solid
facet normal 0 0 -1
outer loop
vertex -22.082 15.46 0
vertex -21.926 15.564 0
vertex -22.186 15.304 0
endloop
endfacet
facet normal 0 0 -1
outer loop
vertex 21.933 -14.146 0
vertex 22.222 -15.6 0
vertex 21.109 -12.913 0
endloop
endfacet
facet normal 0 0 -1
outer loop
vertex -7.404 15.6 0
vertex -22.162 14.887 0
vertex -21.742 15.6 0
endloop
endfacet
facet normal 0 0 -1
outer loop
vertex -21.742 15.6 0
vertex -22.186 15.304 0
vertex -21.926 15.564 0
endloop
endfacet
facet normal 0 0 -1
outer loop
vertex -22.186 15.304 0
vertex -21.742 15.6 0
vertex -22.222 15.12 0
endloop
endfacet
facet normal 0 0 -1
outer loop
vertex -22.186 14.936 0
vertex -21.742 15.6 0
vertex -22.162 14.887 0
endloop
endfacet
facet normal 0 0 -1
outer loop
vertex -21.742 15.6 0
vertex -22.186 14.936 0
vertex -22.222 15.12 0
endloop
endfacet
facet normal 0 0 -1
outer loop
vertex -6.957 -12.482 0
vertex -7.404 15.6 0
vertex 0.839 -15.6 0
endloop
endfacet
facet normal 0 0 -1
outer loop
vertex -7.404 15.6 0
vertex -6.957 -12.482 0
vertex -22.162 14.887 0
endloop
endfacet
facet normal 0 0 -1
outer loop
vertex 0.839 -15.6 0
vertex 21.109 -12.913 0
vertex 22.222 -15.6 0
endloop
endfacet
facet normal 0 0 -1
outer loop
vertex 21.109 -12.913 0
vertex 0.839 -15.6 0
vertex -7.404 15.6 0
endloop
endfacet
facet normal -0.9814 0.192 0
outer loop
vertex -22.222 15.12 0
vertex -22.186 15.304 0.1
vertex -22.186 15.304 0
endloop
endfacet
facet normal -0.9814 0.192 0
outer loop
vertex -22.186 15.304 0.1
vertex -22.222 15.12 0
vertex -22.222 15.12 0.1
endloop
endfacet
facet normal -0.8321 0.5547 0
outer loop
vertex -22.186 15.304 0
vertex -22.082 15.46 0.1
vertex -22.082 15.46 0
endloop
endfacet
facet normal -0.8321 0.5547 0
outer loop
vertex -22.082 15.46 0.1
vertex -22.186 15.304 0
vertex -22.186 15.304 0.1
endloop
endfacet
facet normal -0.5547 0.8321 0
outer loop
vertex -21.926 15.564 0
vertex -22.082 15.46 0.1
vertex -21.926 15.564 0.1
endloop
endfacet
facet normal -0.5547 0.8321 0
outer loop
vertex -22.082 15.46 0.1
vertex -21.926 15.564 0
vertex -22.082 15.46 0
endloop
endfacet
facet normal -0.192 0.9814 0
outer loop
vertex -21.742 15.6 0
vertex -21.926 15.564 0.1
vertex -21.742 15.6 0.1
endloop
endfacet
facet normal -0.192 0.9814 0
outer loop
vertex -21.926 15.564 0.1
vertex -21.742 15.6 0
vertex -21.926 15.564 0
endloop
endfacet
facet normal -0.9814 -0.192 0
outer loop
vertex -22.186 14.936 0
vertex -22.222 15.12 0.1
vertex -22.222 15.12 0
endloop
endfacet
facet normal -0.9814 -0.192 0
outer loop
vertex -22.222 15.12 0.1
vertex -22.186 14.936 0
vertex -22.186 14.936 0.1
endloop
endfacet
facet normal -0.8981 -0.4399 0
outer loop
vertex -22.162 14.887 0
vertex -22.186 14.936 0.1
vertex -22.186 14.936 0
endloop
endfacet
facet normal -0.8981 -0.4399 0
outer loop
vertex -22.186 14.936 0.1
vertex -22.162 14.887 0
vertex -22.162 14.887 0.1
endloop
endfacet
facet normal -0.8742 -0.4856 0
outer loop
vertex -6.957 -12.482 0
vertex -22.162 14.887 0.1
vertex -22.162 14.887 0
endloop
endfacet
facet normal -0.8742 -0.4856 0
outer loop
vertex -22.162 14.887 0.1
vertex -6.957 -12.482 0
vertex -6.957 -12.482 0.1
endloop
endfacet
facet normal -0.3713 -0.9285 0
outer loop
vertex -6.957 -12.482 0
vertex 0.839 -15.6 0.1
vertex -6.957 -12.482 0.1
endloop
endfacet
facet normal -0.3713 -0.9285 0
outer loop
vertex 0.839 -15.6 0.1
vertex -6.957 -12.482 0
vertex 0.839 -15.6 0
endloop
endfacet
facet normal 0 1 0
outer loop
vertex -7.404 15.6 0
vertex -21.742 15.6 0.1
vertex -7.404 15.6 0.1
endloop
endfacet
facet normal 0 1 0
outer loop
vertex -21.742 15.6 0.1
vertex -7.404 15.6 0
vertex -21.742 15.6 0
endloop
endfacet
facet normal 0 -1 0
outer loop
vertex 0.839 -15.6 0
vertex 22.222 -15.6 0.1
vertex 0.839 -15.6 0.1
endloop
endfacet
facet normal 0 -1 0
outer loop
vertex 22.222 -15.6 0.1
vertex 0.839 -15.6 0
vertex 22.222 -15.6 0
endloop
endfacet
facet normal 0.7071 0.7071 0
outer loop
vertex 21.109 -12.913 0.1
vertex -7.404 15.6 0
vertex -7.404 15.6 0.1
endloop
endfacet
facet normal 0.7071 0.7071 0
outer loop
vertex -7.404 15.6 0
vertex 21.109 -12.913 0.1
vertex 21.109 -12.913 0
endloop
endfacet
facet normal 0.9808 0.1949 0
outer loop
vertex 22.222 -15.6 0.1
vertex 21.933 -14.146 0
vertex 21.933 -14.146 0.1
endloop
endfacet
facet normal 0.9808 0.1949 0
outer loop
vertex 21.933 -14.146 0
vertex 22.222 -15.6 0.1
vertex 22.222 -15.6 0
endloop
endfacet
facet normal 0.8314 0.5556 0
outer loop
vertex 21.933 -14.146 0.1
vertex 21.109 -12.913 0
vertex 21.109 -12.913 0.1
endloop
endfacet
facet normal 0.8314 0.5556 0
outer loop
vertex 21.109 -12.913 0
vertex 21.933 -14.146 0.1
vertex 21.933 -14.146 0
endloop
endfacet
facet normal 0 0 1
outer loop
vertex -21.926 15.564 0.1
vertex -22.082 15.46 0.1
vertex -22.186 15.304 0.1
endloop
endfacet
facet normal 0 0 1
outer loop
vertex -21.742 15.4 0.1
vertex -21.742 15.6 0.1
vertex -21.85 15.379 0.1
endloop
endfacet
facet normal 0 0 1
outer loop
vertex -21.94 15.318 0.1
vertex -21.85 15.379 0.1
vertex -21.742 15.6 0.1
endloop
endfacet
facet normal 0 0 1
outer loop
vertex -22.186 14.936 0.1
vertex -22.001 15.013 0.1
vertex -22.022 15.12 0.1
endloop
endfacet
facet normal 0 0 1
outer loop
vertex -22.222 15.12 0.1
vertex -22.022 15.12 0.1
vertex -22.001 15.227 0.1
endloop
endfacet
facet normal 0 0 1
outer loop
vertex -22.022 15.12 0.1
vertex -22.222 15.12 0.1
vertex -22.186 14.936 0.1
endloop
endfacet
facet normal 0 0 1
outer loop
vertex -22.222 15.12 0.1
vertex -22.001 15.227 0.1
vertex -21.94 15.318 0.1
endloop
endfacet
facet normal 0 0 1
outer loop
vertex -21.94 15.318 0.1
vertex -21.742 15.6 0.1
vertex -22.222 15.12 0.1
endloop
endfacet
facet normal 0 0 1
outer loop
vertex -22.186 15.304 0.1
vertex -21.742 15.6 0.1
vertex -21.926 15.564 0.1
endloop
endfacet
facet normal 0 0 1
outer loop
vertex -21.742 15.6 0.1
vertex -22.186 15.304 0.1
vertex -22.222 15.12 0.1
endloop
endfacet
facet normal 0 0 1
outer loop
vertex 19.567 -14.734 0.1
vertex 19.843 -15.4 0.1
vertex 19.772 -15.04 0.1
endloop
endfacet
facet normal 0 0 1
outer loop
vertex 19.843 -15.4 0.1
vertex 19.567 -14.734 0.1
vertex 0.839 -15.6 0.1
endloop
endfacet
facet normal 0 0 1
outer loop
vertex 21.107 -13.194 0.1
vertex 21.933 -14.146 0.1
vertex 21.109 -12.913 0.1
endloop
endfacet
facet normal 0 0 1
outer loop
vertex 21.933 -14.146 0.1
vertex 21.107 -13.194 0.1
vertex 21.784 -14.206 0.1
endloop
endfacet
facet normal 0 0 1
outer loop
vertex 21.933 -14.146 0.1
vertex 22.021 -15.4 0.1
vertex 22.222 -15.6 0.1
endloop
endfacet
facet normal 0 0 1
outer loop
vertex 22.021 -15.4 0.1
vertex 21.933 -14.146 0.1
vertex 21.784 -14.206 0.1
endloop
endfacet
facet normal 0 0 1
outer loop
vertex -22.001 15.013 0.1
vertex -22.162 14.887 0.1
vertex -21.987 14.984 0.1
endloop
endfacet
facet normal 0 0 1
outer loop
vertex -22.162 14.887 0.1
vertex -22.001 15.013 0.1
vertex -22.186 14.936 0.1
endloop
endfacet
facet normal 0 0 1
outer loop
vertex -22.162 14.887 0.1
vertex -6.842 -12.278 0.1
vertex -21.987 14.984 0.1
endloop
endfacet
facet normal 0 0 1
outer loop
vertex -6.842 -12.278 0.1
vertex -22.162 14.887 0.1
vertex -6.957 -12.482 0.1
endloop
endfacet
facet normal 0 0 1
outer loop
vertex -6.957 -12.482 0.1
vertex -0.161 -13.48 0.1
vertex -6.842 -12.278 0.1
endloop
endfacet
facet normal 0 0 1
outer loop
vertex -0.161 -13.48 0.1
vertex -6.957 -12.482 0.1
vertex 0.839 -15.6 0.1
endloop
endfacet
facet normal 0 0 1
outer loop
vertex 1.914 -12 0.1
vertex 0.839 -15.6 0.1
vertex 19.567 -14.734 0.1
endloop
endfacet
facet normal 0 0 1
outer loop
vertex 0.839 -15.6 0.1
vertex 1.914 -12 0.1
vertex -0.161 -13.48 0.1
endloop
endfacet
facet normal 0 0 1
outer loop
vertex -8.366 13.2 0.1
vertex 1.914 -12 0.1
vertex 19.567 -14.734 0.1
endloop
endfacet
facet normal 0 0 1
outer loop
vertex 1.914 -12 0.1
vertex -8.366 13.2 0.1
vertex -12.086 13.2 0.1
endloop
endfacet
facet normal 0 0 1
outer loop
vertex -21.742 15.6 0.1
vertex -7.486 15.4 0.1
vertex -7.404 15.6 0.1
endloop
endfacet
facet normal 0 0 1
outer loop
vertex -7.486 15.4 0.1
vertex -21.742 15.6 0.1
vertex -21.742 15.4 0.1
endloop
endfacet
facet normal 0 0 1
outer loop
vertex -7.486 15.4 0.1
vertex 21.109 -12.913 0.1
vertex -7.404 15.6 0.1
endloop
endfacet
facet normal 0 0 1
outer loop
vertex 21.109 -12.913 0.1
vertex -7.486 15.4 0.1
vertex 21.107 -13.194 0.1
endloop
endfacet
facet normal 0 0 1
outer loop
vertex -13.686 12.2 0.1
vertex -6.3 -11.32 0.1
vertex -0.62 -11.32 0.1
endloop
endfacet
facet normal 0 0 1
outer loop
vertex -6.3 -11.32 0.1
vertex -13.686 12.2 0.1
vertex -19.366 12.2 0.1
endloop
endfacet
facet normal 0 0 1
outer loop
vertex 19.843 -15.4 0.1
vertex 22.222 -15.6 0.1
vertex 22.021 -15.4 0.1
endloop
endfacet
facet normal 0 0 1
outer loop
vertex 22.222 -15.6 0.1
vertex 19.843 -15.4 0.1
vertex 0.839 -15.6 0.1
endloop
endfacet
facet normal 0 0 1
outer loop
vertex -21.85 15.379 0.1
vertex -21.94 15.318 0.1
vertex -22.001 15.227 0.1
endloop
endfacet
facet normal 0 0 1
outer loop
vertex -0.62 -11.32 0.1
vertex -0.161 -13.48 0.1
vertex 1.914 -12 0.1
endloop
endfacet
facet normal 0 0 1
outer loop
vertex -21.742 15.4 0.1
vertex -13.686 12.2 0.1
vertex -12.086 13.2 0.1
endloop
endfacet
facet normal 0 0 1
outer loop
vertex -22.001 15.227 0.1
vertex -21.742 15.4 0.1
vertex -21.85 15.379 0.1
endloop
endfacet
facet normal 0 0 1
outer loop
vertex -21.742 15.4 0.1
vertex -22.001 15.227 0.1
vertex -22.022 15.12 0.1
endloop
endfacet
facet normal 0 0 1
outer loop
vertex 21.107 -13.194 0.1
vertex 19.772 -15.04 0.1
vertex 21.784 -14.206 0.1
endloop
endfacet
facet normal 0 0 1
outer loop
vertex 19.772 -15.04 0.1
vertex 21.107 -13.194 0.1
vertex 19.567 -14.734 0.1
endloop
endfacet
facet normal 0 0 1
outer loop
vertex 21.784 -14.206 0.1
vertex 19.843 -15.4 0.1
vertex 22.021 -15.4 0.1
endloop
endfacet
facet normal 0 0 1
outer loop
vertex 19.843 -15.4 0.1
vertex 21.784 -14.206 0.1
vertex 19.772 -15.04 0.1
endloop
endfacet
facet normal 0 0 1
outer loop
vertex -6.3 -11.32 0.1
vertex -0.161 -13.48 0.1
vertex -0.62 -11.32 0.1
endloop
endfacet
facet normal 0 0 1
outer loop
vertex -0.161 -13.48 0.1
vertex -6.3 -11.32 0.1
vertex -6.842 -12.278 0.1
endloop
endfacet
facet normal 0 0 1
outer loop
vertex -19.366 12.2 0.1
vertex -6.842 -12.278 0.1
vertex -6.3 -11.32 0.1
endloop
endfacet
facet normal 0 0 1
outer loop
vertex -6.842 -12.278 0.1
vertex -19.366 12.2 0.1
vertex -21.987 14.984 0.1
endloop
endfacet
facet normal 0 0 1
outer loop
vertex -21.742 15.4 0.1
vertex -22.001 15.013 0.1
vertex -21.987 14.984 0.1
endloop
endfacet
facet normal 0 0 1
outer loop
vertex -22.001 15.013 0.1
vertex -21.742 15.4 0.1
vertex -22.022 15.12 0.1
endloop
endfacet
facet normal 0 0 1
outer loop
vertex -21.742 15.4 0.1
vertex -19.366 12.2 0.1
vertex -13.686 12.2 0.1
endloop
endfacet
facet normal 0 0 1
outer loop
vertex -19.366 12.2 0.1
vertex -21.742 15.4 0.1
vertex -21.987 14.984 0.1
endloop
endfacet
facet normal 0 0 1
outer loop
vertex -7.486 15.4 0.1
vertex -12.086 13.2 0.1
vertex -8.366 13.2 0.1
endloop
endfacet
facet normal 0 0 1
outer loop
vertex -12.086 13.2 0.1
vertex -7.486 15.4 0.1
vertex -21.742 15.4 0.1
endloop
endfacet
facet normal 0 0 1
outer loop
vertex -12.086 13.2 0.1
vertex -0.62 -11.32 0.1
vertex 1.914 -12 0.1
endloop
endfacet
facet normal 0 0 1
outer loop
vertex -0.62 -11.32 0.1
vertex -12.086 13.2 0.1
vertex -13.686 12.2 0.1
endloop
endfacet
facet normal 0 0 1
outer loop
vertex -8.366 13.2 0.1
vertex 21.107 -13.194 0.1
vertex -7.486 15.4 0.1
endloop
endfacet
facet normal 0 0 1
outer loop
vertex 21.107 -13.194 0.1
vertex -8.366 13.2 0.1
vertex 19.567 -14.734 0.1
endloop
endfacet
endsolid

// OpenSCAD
use <../lib.scad>
function ldraw_lib__169665a() = [
// 0 Sticker  3.9 x  5.6 with Black Space Shuttle Tail Lines Left Side
// 0 Name: 169665a.dat
// 0 Author: Chris Böhnke [KnightOfTarenta]
// 0 !LDRAW_ORG Part UPDATE 2026-06
// 0 !LICENSE Licensed under CC BY 4.0 : see CAreadme.txt
// 
// 0 BFC CERTIFY CCW
  [0,"BFC","CERTIFY"],
  [0,"BFC","CCW"],
// 
// 0 !KEYWORDS Bricklink 6339stk01, Brickowl 588738, Launch Command
// 0 !KEYWORDS Rebrickable 169665, set 6339, Shuttle Launch Pad, space port, town
// 
// 0 !HISTORY 2026-06-28 [OrionP] Official Update 2026-06
// 
// 0 // Sticker Base
// 3 16 -55.205 0 38.649 -54.815 0 38.909 -55.465 0 38.259
  [3,16,-55.205,0,38.649,-54.815,0,38.909,-55.465,0,38.259],
// 3 16 54.833 0 -35.364 55.556 0 -39 52.773 0 -32.282
  [3,16,54.833,0,-35.364,55.556,0,-39,52.773,0,-32.282],
// 3 16 -18.509 0 39 -55.405 0 37.217 -54.356 0 39
  [3,16,-18.509,0,39,-55.405,0,37.217,-54.356,0,39],
// 4 16 -55.465 0 38.259 -54.815 0 38.909 -54.356 0 39 -55.556 0 37.8
  [4,16,-55.465,0,38.259,-54.815,0,38.909,-54.356,0,39,-55.556,0,37.8],
// 4 16 -54.356 0 39 -55.405 0 37.217 -55.465 0 37.341 -55.556 0 37.8
  [4,16,-54.356,0,39,-55.405,0,37.217,-55.465,0,37.341,-55.556,0,37.8],
// 4 16 -55.405 0 37.217 -18.509 0 39 2.098 0 -39 -17.393 0 -31.204
  [4,16,-55.405,0,37.217,-18.509,0,39,2.098,0,-39,-17.393,0,-31.204],
// 4 16 55.556 0 -39 2.098 0 -39 -18.509 0 39 52.773 0 -32.282
  [4,16,55.556,0,-39,2.098,0,-39,-18.509,0,39,52.773,0,-32.282],
// 
// 0 // Sticker Sides
// 4 16 -55.556 -.25 37.8 -55.465 -.25 38.259 -55.465 0 38.259 -55.556 0 37.8
  [4,16,-55.556,-.25,37.8,-55.465,-.25,38.259,-55.465,0,38.259,-55.556,0,37.8],
// 4 16 -55.465 -.25 38.259 -55.205 -.25 38.649 -55.205 0 38.649 -55.465 0 38.259
  [4,16,-55.465,-.25,38.259,-55.205,-.25,38.649,-55.205,0,38.649,-55.465,0,38.259],
// 4 16 -55.205 -.25 38.649 -54.815 -.25 38.909 -54.815 0 38.909 -55.205 0 38.649
  [4,16,-55.205,-.25,38.649,-54.815,-.25,38.909,-54.815,0,38.909,-55.205,0,38.649],
// 4 16 -54.815 -.25 38.909 -54.356 -.25 39 -54.356 0 39 -54.815 0 38.909
  [4,16,-54.815,-.25,38.909,-54.356,-.25,39,-54.356,0,39,-54.815,0,38.909],
// 4 16 -55.556 0 37.8 -55.465 0 37.341 -55.465 -.25 37.341 -55.556 -.25 37.8
  [4,16,-55.556,0,37.8,-55.465,0,37.341,-55.465,-.25,37.341,-55.556,-.25,37.8],
// 4 16 -55.465 0 37.341 -55.405 0 37.217 -55.405 -.25 37.217 -55.465 -.25 37.341
  [4,16,-55.465,0,37.341,-55.405,0,37.217,-55.405,-.25,37.217,-55.465,-.25,37.341],
// 4 16 -55.405 0 37.217 -17.393 0 -31.204 -17.393 -.25 -31.204 -55.405 -.25 37.217
  [4,16,-55.405,0,37.217,-17.393,0,-31.204,-17.393,-.25,-31.204,-55.405,-.25,37.217],
// 4 16 -17.393 0 -31.204 2.098 0 -39 2.098 -.25 -39 -17.393 -.25 -31.204
  [4,16,-17.393,0,-31.204,2.098,0,-39,2.098,-.25,-39,-17.393,-.25,-31.204],
// 4 16 -54.356 -.25 39 -18.509 -.25 39 -18.509 0 39 -54.356 0 39
  [4,16,-54.356,-.25,39,-18.509,-.25,39,-18.509,0,39,-54.356,0,39],
// 4 16 2.098 0 -39 55.556 0 -39 55.556 -.25 -39 2.098 -.25 -39
  [4,16,2.098,0,-39,55.556,0,-39,55.556,-.25,-39,2.098,-.25,-39],
// 4 16 -18.509 0 39 -18.509 -.25 39 52.773 -.25 -32.282 52.773 0 -32.282
  [4,16,-18.509,0,39,-18.509,-.25,39,52.773,-.25,-32.282,52.773,0,-32.282],
// 4 16 54.833 -.25 -35.364 55.556 -.25 -39 55.556 0 -39 54.833 0 -35.364
  [4,16,54.833,-.25,-35.364,55.556,-.25,-39,55.556,0,-39,54.833,0,-35.364],
// 4 16 52.773 -.25 -32.282 54.833 -.25 -35.364 54.833 0 -35.364 52.773 0 -32.282
  [4,16,52.773,-.25,-32.282,54.833,-.25,-35.364,54.833,0,-35.364,52.773,0,-32.282],
// 5 24 -55.556 0 37.8 -55.556 -.25 37.8 -55.465 0 38.259 -55.556 0 36.6
  [5,24,-55.556,0,37.8,-55.556,-.25,37.8,-55.465,0,38.259,-55.556,0,36.6],
// 5 24 -55.465 0 38.259 -55.465 -.25 38.259 -55.205 0 38.649 -55.556 0 37.8
  [5,24,-55.465,0,38.259,-55.465,-.25,38.259,-55.205,0,38.649,-55.556,0,37.8],
// 5 24 -55.205 0 38.649 -55.205 -.25 38.649 -54.815 0 38.909 -55.465 0 38.259
  [5,24,-55.205,0,38.649,-55.205,-.25,38.649,-54.815,0,38.909,-55.465,0,38.259],
// 5 24 -54.815 0 38.909 -54.815 -.25 38.909 -54.356 0 39 -55.205 0 38.649
  [5,24,-54.815,0,38.909,-54.815,-.25,38.909,-54.356,0,39,-55.205,0,38.649],
// 5 24 -54.356 0 39 -54.356 -.25 39 -54.815 0 38.909 -53.156 0 39
  [5,24,-54.356,0,39,-54.356,-.25,39,-54.815,0,38.909,-53.156,0,39],
// 5 24 -55.465 -.25 37.341 -55.465 0 37.341 -55.556 -.25 37.8 -55.274 -.25 36.882
  [5,24,-55.465,-.25,37.341,-55.465,0,37.341,-55.556,-.25,37.8,-55.274,-.25,36.882],
// 5 24 54.833 -.25 -35.364 54.833 0 -35.364 55.556 -.25 -39 52.773 -.25 -32.282
  [5,24,54.833,-.25,-35.364,54.833,0,-35.364,55.556,-.25,-39,52.773,-.25,-32.282],
// 5 24 52.773 -.25 -32.282 52.773 0 -32.282 54.833 -.25 -35.364 49.991 -.25 -29.5
  [5,24,52.773,-.25,-32.282,52.773,0,-32.282,54.833,-.25,-35.364,49.991,-.25,-29.5],
// 5 24 -55.405 0 37.217 -55.405 -.25 37.217 -55.465 -.25 37.341 -17.393 0 -31.204
  [5,24,-55.405,0,37.217,-55.405,-.25,37.217,-55.465,-.25,37.341,-17.393,0,-31.204],
// 
// 0 // Pattern
// 0 // Colour 16 Main Colour
// 3 16 -54.815 -.25 38.909 -55.205 -.25 38.649 -55.465 -.25 38.259
  [3,16,-54.815,-.25,38.909,-55.205,-.25,38.649,-55.465,-.25,38.259],
// 3 16 -54.356 -.25 38.5 -54.356 -.25 39 -54.624 -.25 38.447
  [3,16,-54.356,-.25,38.5,-54.356,-.25,39,-54.624,-.25,38.447],
// 3 16 -54.851 -.25 38.295 -54.624 -.25 38.447 -54.356 -.25 39
  [3,16,-54.851,-.25,38.295,-54.624,-.25,38.447,-54.356,-.25,39],
// 3 16 -55.465 -.25 37.341 -55.003 -.25 37.532 -55.056 -.25 37.8
  [3,16,-55.465,-.25,37.341,-55.003,-.25,37.532,-55.056,-.25,37.8],
// 4 16 -55.003 -.25 38.068 -55.556 -.25 37.8 -55.465 -.25 37.341 -55.056 -.25 37.8
  [4,16,-55.003,-.25,38.068,-55.556,-.25,37.8,-55.465,-.25,37.341,-55.056,-.25,37.8],
// 3 16 -55.556 -.25 37.8 -55.003 -.25 38.068 -54.851 -.25 38.295
  [3,16,-55.556,-.25,37.8,-55.003,-.25,38.068,-54.851,-.25,38.295],
// 3 16 -54.851 -.25 38.295 -54.356 -.25 39 -55.556 -.25 37.8
  [3,16,-54.851,-.25,38.295,-54.356,-.25,39,-55.556,-.25,37.8],
// 4 16 -54.356 -.25 39 -54.815 -.25 38.909 -55.465 -.25 38.259 -55.556 -.25 37.8
  [4,16,-54.356,-.25,39,-54.815,-.25,38.909,-55.465,-.25,38.259,-55.556,-.25,37.8],
// 4 16 2.098 -.25 -39 49.608 -.25 -38.5 49.429 -.25 -37.599 48.918 -.25 -36.835
  [4,16,2.098,-.25,-39,49.608,-.25,-38.5,49.429,-.25,-37.599,48.918,-.25,-36.835],
// 4 16 52.773 -.25 -32.282 52.768 -.25 -32.985 54.459 -.25 -35.515 54.833 -.25 -35.364
  [4,16,52.773,-.25,-32.282,52.768,-.25,-32.985,54.459,-.25,-35.515,54.833,-.25,-35.364],
// 4 16 54.833 -.25 -35.364 54.459 -.25 -35.515 55.053 -.25 -38.5 55.556 -.25 -39
  [4,16,54.833,-.25,-35.364,54.459,-.25,-35.515,55.053,-.25,-38.5,55.556,-.25,-39],
// 4 16 -55.003 -.25 37.532 -55.465 -.25 37.341 -55.405 -.25 37.217 -54.968 -.25 37.46
  [4,16,-55.003,-.25,37.532,-55.465,-.25,37.341,-55.405,-.25,37.217,-54.968,-.25,37.46],
// 4 16 -17.393 -.25 -31.204 -17.105 -.25 -30.694 -54.968 -.25 37.46 -55.405 -.25 37.217
  [4,16,-17.393,-.25,-31.204,-17.105,-.25,-30.694,-54.968,-.25,37.46,-55.405,-.25,37.217],
// 4 16 2.098 -.25 -39 -.402 -.25 -33.7 -17.105 -.25 -30.694 -17.393 -.25 -31.204
  [4,16,2.098,-.25,-39,-.402,-.25,-33.7,-17.105,-.25,-30.694,-17.393,-.25,-31.204],
// 4 16 -.402 -.25 -33.7 2.098 -.25 -39 48.918 -.25 -36.835 4.784 -.25 -30
  [4,16,-.402,-.25,-33.7,2.098,-.25,-39,48.918,-.25,-36.835,4.784,-.25,-30],
// 4 16 48.918 -.25 -36.835 -20.916 -.25 33 -30.216 -.25 33 4.784 -.25 -30
  [4,16,48.918,-.25,-36.835,-20.916,-.25,33,-30.216,-.25,33,4.784,-.25,-30],
// 4 16 -54.356 -.25 39 -54.356 -.25 38.5 -18.716 -.25 38.5 -18.509 -.25 39
  [4,16,-54.356,-.25,39,-54.356,-.25,38.5,-18.716,-.25,38.5,-18.509,-.25,39],
// 4 16 -18.509 -.25 39 -18.716 -.25 38.5 52.768 -.25 -32.985 52.773 -.25 -32.282
  [4,16,-18.509,-.25,39,-18.716,-.25,38.5,52.768,-.25,-32.985,52.773,-.25,-32.282],
// 4 16 -1.55 -.25 -28.3 -34.216 -.25 30.5 -48.416 -.25 30.5 -15.75 -.25 -28.3
  [4,16,-1.55,-.25,-28.3,-34.216,-.25,30.5,-48.416,-.25,30.5,-15.75,-.25,-28.3],
// 4 16 55.556 -.25 -39 55.053 -.25 -38.5 49.608 -.25 -38.5 2.098 -.25 -39
  [4,16,55.556,-.25,-39,55.053,-.25,-38.5,49.608,-.25,-38.5,2.098,-.25,-39],
// 
// 0 BFC NOCLIP
  [0,"BFC","NOCLIP"],
// 0 // Colour 0 Black
// 3 0 -54.624 -.25 38.447 -54.851 -.25 38.295 -55.003 -.25 38.068
  [3,0,-54.624,-.25,38.447,-54.851,-.25,38.295,-55.003,-.25,38.068],
// 3 0 -1.55 -.25 -28.3 -.402 -.25 -33.7 4.784 -.25 -30
  [3,0,-1.55,-.25,-28.3,-.402,-.25,-33.7,4.784,-.25,-30],
// 3 0 -54.356 -.25 38.5 -34.216 -.25 30.5 -30.216 -.25 33
  [3,0,-54.356,-.25,38.5,-34.216,-.25,30.5,-30.216,-.25,33],
// 4 0 -54.356 -.25 38.5 -54.624 -.25 38.447 -55.003 -.25 38.068 -55.056 -.25 37.8
  [4,0,-54.356,-.25,38.5,-54.624,-.25,38.447,-55.003,-.25,38.068,-55.056,-.25,37.8],
// 4 0 52.768 -.25 -32.985 48.918 -.25 -36.835 49.429 -.25 -37.599 54.459 -.25 -35.515
  [4,0,52.768,-.25,-32.985,48.918,-.25,-36.835,49.429,-.25,-37.599,54.459,-.25,-35.515],
// 4 0 54.459 -.25 -35.515 49.429 -.25 -37.599 49.608 -.25 -38.5 55.053 -.25 -38.5
  [4,0,54.459,-.25,-35.515,49.429,-.25,-37.599,49.608,-.25,-38.5,55.053,-.25,-38.5],
// 4 0 -17.105 -.25 -30.694 -.402 -.25 -33.7 -1.55 -.25 -28.3 -15.75 -.25 -28.3
  [4,0,-17.105,-.25,-30.694,-.402,-.25,-33.7,-1.55,-.25,-28.3,-15.75,-.25,-28.3],
// 4 0 -54.968 -.25 37.46 -17.105 -.25 -30.694 -15.75 -.25 -28.3 -48.416 -.25 30.5
  [4,0,-54.968,-.25,37.46,-17.105,-.25,-30.694,-15.75,-.25,-28.3,-48.416,-.25,30.5],
// 4 0 -55.003 -.25 37.532 -54.968 -.25 37.46 -54.356 -.25 38.5 -55.056 -.25 37.8
  [4,0,-55.003,-.25,37.532,-54.968,-.25,37.46,-54.356,-.25,38.5,-55.056,-.25,37.8],
// 4 0 -34.216 -.25 30.5 -54.356 -.25 38.5 -54.968 -.25 37.46 -48.416 -.25 30.5
  [4,0,-34.216,-.25,30.5,-54.356,-.25,38.5,-54.968,-.25,37.46,-48.416,-.25,30.5],
// 4 0 -20.916 -.25 33 -18.716 -.25 38.5 -54.356 -.25 38.5 -30.216 -.25 33
  [4,0,-20.916,-.25,33,-18.716,-.25,38.5,-54.356,-.25,38.5,-30.216,-.25,33],
// 4 0 -1.55 -.25 -28.3 4.784 -.25 -30 -30.216 -.25 33 -34.216 -.25 30.5
  [4,0,-1.55,-.25,-28.3,4.784,-.25,-30,-30.216,-.25,33,-34.216,-.25,30.5],
// 4 0 -20.916 -.25 33 48.918 -.25 -36.835 52.768 -.25 -32.985 -18.716 -.25 38.5
  [4,0,-20.916,-.25,33,48.918,-.25,-36.835,52.768,-.25,-32.985,-18.716,-.25,38.5],
];
module ldraw_lib__169665a(step=0, col=false, unit=2/5, alt=false, line=0.2, solid=!$preview)
    makepoly(ldraw_lib__169665a(), step=step, col=col, unit=unit, alt=alt, line=line, solid=solid);
ldraw_lib__169665a(line=0.2);
